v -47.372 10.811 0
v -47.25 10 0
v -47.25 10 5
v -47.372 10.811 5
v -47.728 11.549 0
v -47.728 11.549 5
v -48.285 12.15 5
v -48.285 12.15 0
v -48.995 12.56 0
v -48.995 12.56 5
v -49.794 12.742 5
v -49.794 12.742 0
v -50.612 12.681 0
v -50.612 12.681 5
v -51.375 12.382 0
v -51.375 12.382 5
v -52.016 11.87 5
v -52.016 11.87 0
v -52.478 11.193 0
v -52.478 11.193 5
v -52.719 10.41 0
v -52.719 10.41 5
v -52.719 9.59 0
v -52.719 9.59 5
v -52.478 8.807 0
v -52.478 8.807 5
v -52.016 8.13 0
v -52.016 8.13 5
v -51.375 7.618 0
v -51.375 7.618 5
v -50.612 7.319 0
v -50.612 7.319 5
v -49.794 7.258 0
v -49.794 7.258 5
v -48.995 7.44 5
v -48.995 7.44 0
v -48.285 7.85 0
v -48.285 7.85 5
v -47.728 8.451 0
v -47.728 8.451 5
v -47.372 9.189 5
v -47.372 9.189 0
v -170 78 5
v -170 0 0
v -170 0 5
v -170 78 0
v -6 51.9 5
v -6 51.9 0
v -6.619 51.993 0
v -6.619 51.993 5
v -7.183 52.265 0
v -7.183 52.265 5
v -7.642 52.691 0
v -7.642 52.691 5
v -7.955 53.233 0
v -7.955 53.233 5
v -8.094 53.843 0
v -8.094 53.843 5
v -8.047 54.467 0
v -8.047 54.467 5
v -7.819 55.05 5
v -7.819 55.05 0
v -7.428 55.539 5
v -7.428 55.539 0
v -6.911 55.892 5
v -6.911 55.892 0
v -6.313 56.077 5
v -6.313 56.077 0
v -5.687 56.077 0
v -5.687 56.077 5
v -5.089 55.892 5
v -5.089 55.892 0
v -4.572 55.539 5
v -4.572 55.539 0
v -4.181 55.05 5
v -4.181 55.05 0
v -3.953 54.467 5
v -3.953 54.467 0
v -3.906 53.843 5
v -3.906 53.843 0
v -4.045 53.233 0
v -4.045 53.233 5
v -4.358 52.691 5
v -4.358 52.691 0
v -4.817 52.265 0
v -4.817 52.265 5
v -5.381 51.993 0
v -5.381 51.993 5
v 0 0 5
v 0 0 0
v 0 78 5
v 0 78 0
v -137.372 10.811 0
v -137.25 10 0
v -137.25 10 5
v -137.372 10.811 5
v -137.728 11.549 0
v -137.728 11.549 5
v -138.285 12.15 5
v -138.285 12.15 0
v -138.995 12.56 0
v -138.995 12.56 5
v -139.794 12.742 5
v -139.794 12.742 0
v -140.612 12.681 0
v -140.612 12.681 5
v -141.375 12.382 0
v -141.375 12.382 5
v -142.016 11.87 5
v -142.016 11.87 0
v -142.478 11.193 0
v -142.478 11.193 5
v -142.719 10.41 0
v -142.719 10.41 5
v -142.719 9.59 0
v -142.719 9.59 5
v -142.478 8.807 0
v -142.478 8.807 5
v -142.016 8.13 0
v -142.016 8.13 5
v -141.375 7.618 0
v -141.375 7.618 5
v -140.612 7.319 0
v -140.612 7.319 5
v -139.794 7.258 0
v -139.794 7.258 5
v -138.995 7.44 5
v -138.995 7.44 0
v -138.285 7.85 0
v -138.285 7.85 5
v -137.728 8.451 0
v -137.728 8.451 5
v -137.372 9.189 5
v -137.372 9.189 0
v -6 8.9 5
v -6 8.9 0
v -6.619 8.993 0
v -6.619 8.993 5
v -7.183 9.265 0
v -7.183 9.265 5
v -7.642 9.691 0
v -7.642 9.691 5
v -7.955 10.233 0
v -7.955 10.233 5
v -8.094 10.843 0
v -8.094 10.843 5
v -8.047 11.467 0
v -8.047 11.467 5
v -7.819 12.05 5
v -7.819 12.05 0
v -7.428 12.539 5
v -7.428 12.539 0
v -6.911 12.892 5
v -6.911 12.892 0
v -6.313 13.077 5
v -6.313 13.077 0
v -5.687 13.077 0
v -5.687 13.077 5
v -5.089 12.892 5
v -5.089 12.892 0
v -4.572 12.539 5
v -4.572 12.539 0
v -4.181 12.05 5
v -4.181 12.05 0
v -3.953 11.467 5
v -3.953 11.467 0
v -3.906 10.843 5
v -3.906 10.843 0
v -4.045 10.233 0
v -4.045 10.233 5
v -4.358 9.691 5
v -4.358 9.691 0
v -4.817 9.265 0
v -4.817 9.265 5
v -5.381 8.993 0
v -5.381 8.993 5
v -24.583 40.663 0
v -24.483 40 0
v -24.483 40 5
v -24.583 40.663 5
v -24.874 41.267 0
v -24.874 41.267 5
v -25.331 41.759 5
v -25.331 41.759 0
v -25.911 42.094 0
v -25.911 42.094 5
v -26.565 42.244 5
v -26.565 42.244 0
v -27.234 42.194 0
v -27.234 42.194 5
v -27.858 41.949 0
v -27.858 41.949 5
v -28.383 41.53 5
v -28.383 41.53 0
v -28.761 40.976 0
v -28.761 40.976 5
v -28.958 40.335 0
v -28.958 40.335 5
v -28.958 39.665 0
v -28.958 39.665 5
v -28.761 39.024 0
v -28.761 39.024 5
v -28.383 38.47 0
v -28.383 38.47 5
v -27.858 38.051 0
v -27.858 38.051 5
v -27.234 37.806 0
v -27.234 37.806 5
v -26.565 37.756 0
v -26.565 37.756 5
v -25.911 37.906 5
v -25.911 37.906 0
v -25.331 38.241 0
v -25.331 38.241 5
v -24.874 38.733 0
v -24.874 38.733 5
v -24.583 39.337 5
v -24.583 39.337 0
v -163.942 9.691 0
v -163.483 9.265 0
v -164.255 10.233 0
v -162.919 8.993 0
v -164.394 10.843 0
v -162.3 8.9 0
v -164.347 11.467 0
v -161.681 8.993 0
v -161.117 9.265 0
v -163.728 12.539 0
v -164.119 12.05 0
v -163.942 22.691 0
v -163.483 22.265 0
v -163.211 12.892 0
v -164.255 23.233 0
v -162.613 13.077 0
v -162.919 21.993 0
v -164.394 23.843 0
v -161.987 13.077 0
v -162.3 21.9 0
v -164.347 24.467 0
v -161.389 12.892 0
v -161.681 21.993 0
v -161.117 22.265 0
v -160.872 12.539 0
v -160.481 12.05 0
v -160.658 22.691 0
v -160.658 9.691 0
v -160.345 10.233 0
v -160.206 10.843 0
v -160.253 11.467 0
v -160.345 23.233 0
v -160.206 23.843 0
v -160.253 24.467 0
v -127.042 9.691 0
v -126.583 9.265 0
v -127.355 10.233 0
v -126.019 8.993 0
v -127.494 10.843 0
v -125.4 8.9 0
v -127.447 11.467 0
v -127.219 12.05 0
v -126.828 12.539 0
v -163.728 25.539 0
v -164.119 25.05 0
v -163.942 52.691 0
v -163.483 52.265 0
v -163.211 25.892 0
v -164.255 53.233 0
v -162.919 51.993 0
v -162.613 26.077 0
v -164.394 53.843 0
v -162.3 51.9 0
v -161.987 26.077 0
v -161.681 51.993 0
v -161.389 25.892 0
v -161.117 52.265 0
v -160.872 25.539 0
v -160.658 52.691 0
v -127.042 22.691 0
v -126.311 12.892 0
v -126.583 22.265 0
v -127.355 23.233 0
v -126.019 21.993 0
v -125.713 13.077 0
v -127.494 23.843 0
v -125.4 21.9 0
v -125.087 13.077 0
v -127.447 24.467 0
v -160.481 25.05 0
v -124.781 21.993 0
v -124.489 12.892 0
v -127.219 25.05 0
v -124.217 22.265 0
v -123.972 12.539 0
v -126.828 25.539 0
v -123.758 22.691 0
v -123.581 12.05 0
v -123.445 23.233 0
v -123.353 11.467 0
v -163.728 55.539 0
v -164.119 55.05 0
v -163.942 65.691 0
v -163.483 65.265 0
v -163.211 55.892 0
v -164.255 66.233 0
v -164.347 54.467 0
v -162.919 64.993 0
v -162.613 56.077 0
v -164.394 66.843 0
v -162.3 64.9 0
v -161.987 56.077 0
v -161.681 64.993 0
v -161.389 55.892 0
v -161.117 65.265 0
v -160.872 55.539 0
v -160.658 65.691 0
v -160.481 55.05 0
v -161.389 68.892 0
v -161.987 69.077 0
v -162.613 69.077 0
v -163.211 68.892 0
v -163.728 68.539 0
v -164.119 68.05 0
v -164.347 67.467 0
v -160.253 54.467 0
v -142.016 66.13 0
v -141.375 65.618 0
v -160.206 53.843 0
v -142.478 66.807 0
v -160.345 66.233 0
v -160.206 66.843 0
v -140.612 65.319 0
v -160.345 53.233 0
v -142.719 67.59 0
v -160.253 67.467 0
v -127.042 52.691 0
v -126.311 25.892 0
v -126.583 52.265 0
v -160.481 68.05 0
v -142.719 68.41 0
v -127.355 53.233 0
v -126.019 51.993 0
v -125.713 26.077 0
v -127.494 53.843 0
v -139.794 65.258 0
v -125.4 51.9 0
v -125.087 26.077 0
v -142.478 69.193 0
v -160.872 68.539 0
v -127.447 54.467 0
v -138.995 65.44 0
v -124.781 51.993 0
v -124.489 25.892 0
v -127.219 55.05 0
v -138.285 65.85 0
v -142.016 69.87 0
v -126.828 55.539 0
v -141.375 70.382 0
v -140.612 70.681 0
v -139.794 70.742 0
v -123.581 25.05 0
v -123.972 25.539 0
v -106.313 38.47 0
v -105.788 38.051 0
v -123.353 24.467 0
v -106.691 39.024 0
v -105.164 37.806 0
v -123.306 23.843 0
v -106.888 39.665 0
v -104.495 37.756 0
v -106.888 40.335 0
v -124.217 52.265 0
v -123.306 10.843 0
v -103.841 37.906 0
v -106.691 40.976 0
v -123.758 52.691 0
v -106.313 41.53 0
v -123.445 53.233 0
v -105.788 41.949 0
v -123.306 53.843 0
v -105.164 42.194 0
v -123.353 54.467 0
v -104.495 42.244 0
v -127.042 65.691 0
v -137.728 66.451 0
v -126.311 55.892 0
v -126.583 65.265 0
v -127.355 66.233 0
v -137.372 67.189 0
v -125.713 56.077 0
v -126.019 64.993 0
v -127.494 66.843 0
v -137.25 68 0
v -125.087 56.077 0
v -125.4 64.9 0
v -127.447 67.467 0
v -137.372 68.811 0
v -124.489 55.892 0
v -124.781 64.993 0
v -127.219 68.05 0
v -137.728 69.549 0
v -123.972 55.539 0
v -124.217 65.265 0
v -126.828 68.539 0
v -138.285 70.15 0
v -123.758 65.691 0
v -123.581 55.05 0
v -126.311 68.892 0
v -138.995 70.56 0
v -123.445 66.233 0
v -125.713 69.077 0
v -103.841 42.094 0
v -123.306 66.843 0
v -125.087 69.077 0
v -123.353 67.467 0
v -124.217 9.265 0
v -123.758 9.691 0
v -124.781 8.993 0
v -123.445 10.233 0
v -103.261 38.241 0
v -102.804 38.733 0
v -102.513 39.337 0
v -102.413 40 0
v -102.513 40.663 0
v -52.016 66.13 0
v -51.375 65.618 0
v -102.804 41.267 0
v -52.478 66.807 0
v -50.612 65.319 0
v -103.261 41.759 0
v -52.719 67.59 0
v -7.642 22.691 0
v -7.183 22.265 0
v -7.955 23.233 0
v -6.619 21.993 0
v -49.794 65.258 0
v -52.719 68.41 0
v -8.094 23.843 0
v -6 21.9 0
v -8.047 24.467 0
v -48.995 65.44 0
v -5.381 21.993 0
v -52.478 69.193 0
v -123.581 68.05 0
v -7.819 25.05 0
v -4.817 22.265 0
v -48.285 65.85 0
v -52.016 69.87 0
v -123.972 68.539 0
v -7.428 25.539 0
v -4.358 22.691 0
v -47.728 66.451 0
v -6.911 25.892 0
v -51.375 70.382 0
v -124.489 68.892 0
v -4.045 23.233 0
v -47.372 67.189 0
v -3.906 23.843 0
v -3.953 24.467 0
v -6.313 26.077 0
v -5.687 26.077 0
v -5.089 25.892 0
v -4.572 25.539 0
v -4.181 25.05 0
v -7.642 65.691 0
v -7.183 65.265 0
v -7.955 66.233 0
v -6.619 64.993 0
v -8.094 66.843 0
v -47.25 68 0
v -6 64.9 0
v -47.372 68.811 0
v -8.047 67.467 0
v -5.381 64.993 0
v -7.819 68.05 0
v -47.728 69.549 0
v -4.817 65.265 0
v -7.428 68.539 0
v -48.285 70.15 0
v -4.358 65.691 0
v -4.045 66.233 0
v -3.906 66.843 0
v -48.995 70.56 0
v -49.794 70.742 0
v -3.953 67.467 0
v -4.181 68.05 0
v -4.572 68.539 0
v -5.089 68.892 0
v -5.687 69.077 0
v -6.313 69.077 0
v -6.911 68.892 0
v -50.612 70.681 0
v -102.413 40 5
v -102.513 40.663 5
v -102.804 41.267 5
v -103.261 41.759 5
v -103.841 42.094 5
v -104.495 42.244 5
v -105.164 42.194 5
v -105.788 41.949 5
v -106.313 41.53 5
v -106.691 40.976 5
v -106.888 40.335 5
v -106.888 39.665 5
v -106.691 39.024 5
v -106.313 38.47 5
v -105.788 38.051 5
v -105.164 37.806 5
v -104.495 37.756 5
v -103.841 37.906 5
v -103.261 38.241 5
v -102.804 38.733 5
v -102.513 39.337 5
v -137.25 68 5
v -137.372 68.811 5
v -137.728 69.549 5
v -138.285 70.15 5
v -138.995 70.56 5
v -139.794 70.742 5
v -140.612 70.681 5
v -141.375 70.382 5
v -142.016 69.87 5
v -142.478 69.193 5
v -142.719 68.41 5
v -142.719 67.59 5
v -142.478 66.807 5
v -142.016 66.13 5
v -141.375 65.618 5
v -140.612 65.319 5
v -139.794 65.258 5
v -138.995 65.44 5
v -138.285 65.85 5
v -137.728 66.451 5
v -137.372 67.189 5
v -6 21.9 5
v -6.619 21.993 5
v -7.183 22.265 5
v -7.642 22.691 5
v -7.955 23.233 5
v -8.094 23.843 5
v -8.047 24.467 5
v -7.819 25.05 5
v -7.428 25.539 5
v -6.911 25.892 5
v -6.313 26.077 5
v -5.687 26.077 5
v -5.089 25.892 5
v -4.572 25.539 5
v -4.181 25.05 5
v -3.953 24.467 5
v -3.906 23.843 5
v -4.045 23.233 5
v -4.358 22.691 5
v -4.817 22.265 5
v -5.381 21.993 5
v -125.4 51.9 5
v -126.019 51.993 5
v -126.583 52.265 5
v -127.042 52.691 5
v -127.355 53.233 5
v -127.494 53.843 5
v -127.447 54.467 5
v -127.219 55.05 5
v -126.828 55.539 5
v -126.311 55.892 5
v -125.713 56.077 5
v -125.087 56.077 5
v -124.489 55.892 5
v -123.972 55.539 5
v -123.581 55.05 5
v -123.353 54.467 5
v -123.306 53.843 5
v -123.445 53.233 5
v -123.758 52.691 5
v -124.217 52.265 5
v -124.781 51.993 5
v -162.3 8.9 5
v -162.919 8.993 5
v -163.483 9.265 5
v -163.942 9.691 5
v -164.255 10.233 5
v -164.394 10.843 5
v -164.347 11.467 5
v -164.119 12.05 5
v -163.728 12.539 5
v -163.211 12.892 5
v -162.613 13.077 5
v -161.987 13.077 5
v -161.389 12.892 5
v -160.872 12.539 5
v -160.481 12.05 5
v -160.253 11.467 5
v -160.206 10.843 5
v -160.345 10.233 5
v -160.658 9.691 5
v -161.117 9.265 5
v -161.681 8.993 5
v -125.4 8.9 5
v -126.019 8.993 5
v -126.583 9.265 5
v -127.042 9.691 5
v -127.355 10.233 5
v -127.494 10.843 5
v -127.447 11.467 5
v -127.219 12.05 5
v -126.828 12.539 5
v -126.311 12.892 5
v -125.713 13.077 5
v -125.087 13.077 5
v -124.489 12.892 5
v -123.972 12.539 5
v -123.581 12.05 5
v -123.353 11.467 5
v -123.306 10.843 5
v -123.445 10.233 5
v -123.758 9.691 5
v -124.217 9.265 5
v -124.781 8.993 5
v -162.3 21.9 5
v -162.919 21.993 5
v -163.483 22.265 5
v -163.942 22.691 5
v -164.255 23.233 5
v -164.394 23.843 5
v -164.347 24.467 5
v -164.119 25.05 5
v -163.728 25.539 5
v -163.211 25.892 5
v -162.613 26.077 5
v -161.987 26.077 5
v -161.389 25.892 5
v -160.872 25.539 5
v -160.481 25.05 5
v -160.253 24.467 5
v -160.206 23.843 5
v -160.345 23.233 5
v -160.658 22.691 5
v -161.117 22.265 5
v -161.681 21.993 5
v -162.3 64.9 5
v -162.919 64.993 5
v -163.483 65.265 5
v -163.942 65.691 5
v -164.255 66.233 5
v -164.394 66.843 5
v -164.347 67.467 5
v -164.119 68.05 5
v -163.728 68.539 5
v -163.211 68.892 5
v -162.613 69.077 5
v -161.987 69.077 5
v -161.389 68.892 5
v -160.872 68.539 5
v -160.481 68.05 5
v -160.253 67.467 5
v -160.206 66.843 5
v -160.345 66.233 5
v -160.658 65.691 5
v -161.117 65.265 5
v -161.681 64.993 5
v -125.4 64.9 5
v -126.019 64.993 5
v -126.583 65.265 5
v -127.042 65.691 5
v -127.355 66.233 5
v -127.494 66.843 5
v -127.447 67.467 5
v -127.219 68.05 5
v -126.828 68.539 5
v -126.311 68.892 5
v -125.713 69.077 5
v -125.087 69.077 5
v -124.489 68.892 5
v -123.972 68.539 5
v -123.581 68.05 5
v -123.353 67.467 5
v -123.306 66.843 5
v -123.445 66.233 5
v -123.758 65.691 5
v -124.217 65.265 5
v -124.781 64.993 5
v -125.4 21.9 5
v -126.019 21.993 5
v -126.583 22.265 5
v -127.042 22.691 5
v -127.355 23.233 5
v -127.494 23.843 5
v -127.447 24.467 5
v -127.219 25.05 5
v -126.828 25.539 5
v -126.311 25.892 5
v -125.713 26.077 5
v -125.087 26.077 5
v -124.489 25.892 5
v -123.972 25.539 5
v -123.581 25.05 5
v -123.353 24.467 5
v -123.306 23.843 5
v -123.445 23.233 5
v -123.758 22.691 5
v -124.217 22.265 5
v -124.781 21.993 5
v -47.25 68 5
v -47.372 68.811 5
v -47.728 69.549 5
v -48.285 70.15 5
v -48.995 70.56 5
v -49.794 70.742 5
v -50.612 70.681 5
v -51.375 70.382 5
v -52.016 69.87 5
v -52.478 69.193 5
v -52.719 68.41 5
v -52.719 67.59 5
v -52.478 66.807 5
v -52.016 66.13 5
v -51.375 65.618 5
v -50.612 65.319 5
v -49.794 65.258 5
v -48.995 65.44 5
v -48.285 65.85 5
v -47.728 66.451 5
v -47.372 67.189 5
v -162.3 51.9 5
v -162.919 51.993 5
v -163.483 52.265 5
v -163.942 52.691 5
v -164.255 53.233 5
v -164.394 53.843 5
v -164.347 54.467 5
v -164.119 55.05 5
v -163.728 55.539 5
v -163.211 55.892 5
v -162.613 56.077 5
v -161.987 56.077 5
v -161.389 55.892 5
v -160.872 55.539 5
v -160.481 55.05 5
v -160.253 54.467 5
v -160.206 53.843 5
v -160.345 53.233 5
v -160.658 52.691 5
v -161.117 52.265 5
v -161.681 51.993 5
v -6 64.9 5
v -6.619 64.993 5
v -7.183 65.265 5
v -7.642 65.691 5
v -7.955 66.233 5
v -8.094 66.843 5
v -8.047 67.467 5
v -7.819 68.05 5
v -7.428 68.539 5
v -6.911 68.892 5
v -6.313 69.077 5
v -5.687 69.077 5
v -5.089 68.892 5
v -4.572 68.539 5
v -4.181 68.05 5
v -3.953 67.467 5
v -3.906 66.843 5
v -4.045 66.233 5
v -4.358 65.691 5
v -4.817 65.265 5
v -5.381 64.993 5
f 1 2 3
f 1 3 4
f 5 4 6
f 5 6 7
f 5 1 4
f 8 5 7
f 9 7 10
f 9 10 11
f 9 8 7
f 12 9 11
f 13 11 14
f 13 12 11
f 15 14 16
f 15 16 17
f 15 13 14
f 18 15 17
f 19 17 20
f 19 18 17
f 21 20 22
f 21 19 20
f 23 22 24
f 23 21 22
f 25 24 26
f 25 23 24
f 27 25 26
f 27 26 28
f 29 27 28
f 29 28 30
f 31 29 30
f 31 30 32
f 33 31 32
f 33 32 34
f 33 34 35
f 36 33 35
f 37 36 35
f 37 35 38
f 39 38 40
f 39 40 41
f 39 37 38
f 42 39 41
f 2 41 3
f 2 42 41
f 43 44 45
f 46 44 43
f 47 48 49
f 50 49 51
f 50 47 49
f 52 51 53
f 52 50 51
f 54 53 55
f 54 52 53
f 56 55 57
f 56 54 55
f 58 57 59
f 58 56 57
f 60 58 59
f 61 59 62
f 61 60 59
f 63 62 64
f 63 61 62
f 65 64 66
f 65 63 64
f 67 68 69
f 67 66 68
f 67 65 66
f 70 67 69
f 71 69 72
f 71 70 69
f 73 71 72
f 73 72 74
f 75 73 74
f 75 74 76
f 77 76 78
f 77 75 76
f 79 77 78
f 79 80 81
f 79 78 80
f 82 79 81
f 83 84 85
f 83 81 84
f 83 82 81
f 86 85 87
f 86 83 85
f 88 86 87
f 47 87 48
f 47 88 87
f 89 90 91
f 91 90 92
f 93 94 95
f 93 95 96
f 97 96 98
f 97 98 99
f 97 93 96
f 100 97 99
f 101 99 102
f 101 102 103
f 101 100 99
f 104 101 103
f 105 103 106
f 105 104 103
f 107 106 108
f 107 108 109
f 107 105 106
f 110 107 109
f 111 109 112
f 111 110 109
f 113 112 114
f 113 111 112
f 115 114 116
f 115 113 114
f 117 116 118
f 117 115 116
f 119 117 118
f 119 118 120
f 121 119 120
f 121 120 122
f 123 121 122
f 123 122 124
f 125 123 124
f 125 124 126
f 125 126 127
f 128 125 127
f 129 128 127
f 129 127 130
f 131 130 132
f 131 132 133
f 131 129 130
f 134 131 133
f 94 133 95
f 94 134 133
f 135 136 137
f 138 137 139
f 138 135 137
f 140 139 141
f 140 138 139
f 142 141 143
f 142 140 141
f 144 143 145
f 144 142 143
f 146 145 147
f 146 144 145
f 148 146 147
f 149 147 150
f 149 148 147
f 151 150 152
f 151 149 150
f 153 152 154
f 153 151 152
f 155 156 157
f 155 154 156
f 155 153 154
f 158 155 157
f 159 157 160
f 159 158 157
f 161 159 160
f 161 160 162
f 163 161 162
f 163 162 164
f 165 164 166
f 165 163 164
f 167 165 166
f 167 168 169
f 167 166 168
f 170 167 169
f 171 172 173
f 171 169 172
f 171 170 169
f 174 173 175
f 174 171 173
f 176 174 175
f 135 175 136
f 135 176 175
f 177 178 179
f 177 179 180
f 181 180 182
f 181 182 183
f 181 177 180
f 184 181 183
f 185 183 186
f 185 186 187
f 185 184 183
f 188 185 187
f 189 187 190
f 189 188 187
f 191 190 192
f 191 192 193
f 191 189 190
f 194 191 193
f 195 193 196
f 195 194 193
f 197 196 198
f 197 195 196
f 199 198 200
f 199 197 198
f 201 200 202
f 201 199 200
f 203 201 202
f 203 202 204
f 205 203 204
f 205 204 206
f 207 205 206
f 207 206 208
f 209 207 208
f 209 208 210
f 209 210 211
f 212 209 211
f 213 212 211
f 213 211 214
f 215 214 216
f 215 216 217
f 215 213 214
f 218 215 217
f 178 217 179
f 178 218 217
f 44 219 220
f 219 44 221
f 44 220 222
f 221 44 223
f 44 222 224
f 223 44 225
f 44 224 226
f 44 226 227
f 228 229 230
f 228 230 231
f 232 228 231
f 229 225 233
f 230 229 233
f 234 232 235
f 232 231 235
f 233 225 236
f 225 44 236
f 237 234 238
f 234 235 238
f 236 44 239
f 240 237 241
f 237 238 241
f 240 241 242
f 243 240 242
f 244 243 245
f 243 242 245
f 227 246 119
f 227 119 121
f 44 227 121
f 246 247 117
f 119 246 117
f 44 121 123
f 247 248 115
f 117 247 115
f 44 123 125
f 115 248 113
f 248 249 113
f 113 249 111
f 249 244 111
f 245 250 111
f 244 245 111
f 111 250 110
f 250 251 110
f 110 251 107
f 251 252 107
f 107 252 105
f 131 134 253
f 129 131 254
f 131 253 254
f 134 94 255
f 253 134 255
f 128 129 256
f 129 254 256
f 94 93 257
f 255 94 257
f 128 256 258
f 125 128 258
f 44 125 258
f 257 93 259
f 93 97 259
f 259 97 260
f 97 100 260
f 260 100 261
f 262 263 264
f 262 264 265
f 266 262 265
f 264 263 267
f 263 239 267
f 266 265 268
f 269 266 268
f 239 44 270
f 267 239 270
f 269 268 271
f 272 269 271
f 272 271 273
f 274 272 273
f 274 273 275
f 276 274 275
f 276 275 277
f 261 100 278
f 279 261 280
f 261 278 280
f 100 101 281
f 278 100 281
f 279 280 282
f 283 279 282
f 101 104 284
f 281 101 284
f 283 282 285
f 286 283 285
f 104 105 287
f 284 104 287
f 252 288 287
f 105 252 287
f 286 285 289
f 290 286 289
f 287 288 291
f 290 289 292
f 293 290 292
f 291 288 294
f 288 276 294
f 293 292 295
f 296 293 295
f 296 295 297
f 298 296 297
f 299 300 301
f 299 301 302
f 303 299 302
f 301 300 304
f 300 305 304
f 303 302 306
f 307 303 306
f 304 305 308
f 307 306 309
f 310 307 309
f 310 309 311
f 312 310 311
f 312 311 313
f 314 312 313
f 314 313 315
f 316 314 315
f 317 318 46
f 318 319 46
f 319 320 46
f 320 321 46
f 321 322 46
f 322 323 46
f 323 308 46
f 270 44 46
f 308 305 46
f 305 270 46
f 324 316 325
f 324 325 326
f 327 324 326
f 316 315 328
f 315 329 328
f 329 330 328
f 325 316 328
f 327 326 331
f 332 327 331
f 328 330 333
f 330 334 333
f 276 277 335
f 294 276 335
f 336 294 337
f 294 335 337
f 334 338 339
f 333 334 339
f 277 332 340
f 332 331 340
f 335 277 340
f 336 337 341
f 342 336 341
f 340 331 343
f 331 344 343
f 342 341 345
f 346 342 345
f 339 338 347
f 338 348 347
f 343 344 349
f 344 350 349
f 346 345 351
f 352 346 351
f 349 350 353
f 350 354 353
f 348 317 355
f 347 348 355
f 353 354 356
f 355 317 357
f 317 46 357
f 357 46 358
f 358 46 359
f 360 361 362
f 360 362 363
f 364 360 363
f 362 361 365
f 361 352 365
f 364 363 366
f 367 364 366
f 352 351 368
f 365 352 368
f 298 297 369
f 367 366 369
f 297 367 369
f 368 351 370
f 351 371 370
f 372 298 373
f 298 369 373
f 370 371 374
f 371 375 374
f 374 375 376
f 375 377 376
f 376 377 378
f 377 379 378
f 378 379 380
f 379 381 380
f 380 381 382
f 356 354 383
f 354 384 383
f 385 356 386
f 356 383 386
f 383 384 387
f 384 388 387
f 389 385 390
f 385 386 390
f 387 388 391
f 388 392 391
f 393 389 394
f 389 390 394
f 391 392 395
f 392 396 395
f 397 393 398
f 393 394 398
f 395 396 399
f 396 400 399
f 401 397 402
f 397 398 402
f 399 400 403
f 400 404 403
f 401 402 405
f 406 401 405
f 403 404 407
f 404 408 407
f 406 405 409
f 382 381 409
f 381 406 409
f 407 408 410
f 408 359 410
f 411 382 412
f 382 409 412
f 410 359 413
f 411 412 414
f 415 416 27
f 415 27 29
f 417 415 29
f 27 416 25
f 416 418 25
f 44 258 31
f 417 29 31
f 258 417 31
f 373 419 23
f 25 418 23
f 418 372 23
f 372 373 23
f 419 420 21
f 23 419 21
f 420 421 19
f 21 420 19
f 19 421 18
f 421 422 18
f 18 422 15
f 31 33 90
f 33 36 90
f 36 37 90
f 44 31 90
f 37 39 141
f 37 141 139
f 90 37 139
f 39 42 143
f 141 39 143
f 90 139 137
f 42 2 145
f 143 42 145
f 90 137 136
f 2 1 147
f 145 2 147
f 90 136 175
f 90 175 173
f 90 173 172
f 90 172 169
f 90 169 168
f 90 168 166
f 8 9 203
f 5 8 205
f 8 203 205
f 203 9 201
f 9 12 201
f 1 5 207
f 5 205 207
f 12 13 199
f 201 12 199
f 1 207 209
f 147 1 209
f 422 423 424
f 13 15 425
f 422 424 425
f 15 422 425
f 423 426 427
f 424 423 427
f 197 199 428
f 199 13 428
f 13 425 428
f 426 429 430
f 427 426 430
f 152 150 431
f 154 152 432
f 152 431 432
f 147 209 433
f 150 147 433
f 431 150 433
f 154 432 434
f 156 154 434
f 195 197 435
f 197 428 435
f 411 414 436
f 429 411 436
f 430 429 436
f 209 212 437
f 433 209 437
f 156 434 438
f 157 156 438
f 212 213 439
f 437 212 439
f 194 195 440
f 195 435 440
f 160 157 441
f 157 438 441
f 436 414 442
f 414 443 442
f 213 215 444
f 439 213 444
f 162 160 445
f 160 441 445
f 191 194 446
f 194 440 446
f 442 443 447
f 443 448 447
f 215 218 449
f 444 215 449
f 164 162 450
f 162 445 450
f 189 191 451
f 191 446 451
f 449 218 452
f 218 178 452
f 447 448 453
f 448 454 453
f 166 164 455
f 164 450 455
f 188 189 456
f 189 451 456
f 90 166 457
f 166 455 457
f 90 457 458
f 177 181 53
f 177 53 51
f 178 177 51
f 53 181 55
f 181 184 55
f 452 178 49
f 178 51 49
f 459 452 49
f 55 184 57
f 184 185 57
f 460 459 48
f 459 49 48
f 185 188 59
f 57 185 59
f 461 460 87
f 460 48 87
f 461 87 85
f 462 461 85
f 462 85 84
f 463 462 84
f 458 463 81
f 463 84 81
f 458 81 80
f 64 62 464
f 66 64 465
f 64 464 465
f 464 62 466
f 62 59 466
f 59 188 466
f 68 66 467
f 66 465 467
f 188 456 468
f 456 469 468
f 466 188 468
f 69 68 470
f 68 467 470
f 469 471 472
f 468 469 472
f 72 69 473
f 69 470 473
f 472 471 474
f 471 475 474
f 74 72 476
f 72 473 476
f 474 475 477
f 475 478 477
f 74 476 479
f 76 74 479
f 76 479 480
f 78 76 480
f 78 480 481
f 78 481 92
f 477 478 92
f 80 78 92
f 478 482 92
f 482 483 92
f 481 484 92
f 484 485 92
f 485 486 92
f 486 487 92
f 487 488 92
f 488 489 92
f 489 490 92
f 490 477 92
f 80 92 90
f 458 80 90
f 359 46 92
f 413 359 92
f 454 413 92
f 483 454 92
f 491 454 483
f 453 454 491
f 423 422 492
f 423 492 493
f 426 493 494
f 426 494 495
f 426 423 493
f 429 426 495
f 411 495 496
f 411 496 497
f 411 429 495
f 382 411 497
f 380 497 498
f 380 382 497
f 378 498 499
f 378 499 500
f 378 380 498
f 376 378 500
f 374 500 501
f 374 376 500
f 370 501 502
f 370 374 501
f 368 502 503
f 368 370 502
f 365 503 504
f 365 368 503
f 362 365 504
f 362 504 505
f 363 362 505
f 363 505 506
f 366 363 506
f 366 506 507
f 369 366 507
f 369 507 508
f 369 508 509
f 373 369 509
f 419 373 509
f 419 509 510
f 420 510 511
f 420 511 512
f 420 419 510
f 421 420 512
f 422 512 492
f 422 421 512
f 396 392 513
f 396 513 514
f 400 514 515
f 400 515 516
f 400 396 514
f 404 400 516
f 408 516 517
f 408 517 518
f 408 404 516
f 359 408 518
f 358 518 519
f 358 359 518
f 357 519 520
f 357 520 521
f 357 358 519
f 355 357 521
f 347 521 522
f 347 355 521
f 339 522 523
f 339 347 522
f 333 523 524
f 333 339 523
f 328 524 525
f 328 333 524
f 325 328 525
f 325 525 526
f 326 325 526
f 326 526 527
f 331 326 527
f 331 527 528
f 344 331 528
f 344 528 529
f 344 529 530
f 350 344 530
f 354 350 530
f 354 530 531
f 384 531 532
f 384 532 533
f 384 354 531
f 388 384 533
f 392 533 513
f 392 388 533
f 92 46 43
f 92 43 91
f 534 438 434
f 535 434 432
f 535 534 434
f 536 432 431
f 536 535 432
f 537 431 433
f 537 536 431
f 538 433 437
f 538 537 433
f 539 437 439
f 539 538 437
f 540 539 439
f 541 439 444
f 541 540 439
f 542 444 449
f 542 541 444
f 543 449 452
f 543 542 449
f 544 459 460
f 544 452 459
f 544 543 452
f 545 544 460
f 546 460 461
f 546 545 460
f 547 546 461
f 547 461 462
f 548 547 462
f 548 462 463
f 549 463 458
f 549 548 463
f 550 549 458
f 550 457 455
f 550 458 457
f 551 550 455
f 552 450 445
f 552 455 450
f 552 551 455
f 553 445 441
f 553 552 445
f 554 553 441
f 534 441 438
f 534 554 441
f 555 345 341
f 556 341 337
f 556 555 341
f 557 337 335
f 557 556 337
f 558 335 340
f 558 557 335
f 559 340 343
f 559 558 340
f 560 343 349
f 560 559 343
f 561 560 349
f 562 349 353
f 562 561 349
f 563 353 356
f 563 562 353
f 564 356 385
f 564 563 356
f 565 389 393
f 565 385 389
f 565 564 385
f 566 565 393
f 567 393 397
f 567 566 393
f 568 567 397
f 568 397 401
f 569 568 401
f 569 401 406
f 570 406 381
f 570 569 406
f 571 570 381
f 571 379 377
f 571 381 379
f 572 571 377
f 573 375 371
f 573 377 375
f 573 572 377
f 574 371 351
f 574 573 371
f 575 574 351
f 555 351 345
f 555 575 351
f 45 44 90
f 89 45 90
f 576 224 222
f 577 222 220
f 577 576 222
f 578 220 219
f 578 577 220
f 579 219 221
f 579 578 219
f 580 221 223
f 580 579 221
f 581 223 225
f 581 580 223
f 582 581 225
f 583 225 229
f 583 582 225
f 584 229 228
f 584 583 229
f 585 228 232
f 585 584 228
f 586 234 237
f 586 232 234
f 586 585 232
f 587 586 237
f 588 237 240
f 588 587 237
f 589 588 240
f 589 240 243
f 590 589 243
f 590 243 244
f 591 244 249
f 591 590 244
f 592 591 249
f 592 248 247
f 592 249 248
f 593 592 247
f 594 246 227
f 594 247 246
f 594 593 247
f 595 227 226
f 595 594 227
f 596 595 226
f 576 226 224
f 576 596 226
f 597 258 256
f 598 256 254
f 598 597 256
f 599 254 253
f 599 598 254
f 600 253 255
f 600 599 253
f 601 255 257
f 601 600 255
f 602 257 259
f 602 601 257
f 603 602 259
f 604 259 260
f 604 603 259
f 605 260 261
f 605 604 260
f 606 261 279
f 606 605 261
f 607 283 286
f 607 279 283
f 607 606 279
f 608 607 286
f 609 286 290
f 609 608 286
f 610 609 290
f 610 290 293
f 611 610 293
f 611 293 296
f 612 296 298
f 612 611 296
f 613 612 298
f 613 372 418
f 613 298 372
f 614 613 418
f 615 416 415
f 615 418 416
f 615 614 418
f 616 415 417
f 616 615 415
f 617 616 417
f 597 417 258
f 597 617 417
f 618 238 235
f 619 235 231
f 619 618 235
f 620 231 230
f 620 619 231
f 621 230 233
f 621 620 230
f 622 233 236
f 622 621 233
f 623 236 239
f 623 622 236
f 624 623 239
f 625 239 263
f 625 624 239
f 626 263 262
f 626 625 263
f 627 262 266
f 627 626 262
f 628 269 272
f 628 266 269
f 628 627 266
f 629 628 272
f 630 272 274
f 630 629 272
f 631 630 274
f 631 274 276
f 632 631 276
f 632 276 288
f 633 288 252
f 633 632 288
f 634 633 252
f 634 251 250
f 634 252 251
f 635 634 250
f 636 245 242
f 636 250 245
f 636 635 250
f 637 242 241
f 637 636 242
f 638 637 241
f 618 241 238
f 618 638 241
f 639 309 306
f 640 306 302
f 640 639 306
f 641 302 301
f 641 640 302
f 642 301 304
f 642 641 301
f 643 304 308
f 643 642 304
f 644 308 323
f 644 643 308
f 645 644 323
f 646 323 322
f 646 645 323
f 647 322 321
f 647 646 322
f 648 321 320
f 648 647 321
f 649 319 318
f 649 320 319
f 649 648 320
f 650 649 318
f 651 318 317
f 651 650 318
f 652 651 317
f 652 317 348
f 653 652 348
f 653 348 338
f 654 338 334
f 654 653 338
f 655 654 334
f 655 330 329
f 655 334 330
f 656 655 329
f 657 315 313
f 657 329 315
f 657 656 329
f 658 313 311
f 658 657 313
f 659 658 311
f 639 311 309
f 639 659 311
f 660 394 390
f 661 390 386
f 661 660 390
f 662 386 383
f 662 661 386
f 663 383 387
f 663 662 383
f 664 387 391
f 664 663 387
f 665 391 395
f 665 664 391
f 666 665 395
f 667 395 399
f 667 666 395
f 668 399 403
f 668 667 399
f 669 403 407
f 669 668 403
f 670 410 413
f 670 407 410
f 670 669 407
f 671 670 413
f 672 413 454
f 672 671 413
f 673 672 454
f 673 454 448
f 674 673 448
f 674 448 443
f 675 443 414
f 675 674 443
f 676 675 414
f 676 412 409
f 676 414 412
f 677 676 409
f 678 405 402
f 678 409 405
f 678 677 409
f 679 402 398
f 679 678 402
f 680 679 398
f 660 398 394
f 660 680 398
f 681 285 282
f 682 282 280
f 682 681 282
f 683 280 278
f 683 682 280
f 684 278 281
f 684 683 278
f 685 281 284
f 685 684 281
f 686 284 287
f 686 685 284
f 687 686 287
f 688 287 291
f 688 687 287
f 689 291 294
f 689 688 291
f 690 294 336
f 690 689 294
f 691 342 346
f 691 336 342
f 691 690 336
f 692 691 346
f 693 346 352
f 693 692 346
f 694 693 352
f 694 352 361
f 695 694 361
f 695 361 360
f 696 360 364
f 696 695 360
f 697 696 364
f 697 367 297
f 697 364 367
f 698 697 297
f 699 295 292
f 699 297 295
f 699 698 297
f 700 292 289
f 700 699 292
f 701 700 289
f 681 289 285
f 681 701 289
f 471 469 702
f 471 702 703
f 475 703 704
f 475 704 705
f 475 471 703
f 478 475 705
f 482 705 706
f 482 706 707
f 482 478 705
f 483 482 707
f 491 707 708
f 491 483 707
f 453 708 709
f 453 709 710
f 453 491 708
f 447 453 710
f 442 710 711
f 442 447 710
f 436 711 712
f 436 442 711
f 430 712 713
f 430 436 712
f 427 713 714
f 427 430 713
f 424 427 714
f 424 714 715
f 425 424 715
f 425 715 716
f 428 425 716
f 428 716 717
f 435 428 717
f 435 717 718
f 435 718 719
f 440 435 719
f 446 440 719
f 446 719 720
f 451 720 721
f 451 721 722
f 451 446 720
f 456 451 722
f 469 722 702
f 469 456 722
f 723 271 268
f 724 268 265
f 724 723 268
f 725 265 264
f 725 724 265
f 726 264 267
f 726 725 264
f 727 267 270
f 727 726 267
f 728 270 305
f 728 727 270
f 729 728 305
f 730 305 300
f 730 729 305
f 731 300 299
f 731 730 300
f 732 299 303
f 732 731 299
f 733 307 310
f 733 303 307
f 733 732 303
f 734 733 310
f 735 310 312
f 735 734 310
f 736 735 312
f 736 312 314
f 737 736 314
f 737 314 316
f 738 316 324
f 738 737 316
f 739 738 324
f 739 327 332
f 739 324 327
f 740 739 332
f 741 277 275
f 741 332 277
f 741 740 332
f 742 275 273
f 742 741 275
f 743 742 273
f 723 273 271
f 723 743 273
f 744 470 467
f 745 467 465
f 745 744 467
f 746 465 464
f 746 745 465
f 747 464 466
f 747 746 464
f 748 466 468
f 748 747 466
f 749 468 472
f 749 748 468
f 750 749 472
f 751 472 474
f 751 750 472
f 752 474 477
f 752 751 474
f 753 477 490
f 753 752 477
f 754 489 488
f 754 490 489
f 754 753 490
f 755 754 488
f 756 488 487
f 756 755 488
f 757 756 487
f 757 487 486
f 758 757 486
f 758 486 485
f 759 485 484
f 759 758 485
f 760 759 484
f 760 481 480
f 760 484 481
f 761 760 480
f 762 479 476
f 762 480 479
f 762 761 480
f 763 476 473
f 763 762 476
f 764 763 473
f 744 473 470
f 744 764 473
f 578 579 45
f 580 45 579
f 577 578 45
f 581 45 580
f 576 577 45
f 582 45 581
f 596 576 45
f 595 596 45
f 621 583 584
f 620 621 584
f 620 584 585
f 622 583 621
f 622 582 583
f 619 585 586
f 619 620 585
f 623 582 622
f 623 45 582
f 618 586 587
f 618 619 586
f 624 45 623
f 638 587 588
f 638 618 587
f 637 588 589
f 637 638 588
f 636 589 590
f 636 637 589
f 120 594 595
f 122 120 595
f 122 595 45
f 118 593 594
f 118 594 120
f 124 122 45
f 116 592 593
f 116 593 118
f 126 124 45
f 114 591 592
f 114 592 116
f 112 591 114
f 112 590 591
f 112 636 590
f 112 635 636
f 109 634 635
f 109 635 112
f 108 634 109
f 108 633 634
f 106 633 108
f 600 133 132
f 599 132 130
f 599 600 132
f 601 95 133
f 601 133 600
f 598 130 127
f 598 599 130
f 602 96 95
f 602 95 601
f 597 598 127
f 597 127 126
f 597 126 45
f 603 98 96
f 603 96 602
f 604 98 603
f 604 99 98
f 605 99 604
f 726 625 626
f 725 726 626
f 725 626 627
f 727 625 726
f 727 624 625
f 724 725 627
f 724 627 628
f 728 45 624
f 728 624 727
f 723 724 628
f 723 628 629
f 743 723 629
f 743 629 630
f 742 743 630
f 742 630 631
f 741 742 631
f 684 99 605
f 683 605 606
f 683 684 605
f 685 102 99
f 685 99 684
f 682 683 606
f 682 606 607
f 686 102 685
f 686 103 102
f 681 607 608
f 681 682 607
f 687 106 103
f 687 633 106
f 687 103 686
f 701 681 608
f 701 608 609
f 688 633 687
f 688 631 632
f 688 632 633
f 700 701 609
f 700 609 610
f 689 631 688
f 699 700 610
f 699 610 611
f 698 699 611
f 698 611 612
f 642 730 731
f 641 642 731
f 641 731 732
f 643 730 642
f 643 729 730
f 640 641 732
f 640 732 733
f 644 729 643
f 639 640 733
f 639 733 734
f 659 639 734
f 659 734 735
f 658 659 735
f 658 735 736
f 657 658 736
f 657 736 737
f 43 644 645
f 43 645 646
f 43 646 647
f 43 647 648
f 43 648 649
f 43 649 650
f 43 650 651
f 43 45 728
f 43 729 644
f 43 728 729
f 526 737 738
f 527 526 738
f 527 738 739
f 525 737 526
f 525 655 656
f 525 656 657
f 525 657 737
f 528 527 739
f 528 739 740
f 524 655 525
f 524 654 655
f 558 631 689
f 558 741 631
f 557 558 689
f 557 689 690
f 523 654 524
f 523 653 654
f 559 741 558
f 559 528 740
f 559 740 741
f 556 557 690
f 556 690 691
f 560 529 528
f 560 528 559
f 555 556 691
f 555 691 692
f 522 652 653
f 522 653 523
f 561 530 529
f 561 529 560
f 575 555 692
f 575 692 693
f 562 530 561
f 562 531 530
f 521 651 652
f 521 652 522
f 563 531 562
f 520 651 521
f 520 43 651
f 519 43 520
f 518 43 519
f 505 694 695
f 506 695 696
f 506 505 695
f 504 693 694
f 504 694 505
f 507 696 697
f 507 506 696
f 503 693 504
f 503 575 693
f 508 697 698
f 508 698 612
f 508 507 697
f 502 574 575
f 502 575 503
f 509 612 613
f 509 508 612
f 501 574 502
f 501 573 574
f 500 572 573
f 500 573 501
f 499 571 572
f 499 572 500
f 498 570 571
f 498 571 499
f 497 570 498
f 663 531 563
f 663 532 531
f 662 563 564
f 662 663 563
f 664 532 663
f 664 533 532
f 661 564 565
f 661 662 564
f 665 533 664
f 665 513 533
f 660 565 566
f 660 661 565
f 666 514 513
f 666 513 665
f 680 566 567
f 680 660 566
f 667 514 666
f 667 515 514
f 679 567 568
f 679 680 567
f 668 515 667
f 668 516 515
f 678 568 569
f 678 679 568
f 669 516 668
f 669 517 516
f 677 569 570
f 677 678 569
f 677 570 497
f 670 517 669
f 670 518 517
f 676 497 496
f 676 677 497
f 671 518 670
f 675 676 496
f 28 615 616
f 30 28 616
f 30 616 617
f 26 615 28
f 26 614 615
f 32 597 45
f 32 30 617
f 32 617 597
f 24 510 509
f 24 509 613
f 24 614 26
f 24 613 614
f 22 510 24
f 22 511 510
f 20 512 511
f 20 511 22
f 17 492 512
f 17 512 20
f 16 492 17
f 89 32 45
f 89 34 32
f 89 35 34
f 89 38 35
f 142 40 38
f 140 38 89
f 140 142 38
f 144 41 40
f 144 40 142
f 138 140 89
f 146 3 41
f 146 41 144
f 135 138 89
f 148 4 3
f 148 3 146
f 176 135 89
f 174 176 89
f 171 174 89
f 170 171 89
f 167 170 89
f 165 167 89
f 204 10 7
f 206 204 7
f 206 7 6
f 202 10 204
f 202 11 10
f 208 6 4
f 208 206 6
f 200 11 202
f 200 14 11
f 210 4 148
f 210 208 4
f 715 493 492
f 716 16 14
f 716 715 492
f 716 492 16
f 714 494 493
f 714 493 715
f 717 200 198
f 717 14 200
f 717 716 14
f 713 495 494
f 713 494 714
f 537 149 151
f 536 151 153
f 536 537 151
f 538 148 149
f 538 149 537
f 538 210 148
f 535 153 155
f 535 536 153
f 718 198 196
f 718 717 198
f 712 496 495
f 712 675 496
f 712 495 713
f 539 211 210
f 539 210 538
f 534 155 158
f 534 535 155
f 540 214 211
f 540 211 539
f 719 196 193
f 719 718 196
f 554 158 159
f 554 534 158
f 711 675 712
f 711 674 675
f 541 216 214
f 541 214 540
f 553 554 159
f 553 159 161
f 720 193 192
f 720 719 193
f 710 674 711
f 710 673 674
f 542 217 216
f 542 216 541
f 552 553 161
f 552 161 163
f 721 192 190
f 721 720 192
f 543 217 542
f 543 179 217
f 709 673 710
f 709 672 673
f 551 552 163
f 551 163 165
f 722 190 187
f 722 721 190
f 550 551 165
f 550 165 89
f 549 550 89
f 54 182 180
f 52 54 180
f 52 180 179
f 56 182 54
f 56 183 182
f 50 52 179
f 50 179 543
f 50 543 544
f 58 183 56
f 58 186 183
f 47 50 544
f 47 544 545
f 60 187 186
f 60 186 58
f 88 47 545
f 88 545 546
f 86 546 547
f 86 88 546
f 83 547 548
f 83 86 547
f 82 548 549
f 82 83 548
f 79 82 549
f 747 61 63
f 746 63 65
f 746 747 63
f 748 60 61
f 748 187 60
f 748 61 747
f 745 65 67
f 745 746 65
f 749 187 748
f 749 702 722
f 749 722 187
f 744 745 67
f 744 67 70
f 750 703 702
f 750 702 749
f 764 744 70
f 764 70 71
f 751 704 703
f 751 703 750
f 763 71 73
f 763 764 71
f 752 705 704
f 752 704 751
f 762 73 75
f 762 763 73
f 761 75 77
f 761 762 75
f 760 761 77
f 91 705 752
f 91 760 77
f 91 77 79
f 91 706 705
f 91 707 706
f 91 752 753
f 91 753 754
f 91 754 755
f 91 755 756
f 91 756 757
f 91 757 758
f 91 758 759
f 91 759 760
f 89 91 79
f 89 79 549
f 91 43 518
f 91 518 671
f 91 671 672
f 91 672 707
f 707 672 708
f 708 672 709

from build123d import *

# Parameters (mm, degrees)
SKETCH_3_W                  = 170
SKETCH_3_H                  = 78
SKETCH_3_R                  = 2.75
SKETCH_3_R_2                = 2.25
EXTRUDE_1_DEPTH             = 5
HOLE_WIZARD_M5_1_AT_2_COUNT = 2
HOLE_WIZARD_M5_1_AT_2_PITCH = 13
HOLE_WIZARD_M5_1_AT_3_COUNT = 2
HOLE_WIZARD_M5_1_AT_3_PITCH = 30
HOLE_WIZARD_M5_1_AT_4_COUNT = 2
HOLE_WIZARD_M5_1_AT_4_PITCH = 43
PATTERN_LINEAR_1_COUNT      = 2
PATTERN_LINEAR_1_PITCH      = 36.9
PATTERN_LINEAR_2_COUNT      = 2
PATTERN_LINEAR_2_PITCH      = 156.3


with BuildPart() as part:
    # 草图3 → 凸台-拉伸1 (new body)
    with BuildSketch(Plane.XY):
        with Locations((-85, 39)):
            Rectangle(SKETCH_3_W, SKETCH_3_H)
        with Locations((-140, 68)):
            Circle(SKETCH_3_R, mode=Mode.SUBTRACT)
        with Locations((-140, 10)):
            Circle(SKETCH_3_R, mode=Mode.SUBTRACT)
        with Locations((-50, 10)):
            Circle(SKETCH_3_R, mode=Mode.SUBTRACT)
        with Locations((-50, 68)):
            Circle(SKETCH_3_R, mode=Mode.SUBTRACT)
        with Locations((-104.6634, 40)):
            Circle(SKETCH_3_R_2, mode=Mode.SUBTRACT)
        with Locations((-26.7334, 40)):
            Circle(SKETCH_3_R_2, mode=Mode.SUBTRACT)
    extrude(amount=EXTRUDE_1_DEPTH)

    # 草图6 → M5 螺纹孔1 (revolve, cut)
    with BuildSketch(Plane(origin=(-162.3, 54, 5), x_dir=(0, -1, 0), z_dir=(1, 0, 0))):
        Polygon((0, 0), (0, 13.6618073), (2.1, 12.4), (2.1, 0), align=None)
    hole_wizard_m5_1 = revolve(axis=Axis((-162.3, 54, 11.35), (0, 0, -1)), mode=Mode.SUBTRACT)

    # M5 螺纹孔1 at 2: M5 螺纹孔1 ×2
    with Locations(*[(0, i * HOLE_WIZARD_M5_1_AT_2_PITCH, 0) for i in range(1, HOLE_WIZARD_M5_1_AT_2_COUNT)]):
        add(hole_wizard_m5_1, mode=Mode.SUBTRACT)

    # M5 螺纹孔1 at 3: M5 螺纹孔1 ×2
    with Locations(*[(0, -i * HOLE_WIZARD_M5_1_AT_3_PITCH, 0) for i in range(1, HOLE_WIZARD_M5_1_AT_3_COUNT)]):
        add(hole_wizard_m5_1, mode=Mode.SUBTRACT)

    # M5 螺纹孔1 at 4: M5 螺纹孔1 ×2
    with Locations(*[(0, -i * HOLE_WIZARD_M5_1_AT_4_PITCH, 0) for i in range(1, HOLE_WIZARD_M5_1_AT_4_COUNT)]):
        add(hole_wizard_m5_1, mode=Mode.SUBTRACT)

    # 阵列(线性)1: M5 螺纹孔1 ×2
    with Locations(*[(i * PATTERN_LINEAR_1_PITCH, 0, 0) for i in range(1, PATTERN_LINEAR_1_COUNT)]):
        add(hole_wizard_m5_1, mode=Mode.SUBTRACT)

    # 阵列(线性)1 copy 1 sketch → 阵列(线性)1 copy 1 (revolve, cut)
    with BuildSketch(Plane(origin=(-125.4, 67, 5), x_dir=(0, -1, 0), z_dir=(1, 0, 0))):
        Polygon((0, 0), (0, 13.6618073), (2.1, 12.4), (2.1, 0), align=None)
    revolve(axis=Axis((-125.4, 67, 11.35), (0, 0, -1)), mode=Mode.SUBTRACT)

    # 阵列(线性)1 copy 2 sketch → 阵列(线性)1 copy 2 (revolve, cut)
    with BuildSketch(Plane(origin=(-125.4, 24, 5), x_dir=(0, -1, 0), z_dir=(1, 0, 0))):
        Polygon((0, 0), (0, 13.6618073), (2.1, 12.4), (2.1, 0), align=None)
    revolve(axis=Axis((-125.4, 24, 11.35), (0, 0, -1)), mode=Mode.SUBTRACT)

    # 阵列(线性)1 copy 3 sketch → 阵列(线性)1 copy 3 (revolve, cut)
    with BuildSketch(Plane(origin=(-125.4, 11, 5), x_dir=(0, -1, 0), z_dir=(1, 0, 0))):
        Polygon((0, 0), (0, 13.6618073), (2.1, 12.4), (2.1, 0), align=None)
    revolve(axis=Axis((-125.4, 11, 11.35), (0, 0, -1)), mode=Mode.SUBTRACT)

    # 阵列(线性)2: M5 螺纹孔1 ×2
    with Locations(*[(i * PATTERN_LINEAR_2_PITCH, 0, 0) for i in range(1, PATTERN_LINEAR_2_COUNT)]):
        add(hole_wizard_m5_1, mode=Mode.SUBTRACT)

    # 阵列(线性)2 copy 1 sketch → 阵列(线性)2 copy 1 (revolve, cut)
    with BuildSketch(Plane(origin=(-6, 67, 5), x_dir=(0, -1, 0), z_dir=(1, 0, 0))):
        Polygon((0, 0), (0, 13.6618073), (2.1, 12.4), (2.1, 0), align=None)
    revolve(axis=Axis((-6, 67, 11.35), (0, 0, -1)), mode=Mode.SUBTRACT)

    # 阵列(线性)2 copy 2 sketch → 阵列(线性)2 copy 2 (revolve, cut)
    with BuildSketch(Plane(origin=(-6, 24, 5), x_dir=(0, -1, 0), z_dir=(1, 0, 0))):
        Polygon((0, 0), (0, 13.6618073), (2.1, 12.4), (2.1, 0), align=None)
    revolve(axis=Axis((-6, 24, 11.35), (0, 0, -1)), mode=Mode.SUBTRACT)

    # 阵列(线性)2 copy 3 sketch → 阵列(线性)2 copy 3 (revolve, cut)
    with BuildSketch(Plane(origin=(-6, 11, 5), x_dir=(0, -1, 0), z_dir=(1, 0, 0))):
        Polygon((0, 0), (0, 13.6618073), (2.1, 12.4), (2.1, 0), align=None)
    revolve(axis=Axis((-6, 11, 11.35), (0, 0, -1)), mode=Mode.SUBTRACT)


solid = part.part
